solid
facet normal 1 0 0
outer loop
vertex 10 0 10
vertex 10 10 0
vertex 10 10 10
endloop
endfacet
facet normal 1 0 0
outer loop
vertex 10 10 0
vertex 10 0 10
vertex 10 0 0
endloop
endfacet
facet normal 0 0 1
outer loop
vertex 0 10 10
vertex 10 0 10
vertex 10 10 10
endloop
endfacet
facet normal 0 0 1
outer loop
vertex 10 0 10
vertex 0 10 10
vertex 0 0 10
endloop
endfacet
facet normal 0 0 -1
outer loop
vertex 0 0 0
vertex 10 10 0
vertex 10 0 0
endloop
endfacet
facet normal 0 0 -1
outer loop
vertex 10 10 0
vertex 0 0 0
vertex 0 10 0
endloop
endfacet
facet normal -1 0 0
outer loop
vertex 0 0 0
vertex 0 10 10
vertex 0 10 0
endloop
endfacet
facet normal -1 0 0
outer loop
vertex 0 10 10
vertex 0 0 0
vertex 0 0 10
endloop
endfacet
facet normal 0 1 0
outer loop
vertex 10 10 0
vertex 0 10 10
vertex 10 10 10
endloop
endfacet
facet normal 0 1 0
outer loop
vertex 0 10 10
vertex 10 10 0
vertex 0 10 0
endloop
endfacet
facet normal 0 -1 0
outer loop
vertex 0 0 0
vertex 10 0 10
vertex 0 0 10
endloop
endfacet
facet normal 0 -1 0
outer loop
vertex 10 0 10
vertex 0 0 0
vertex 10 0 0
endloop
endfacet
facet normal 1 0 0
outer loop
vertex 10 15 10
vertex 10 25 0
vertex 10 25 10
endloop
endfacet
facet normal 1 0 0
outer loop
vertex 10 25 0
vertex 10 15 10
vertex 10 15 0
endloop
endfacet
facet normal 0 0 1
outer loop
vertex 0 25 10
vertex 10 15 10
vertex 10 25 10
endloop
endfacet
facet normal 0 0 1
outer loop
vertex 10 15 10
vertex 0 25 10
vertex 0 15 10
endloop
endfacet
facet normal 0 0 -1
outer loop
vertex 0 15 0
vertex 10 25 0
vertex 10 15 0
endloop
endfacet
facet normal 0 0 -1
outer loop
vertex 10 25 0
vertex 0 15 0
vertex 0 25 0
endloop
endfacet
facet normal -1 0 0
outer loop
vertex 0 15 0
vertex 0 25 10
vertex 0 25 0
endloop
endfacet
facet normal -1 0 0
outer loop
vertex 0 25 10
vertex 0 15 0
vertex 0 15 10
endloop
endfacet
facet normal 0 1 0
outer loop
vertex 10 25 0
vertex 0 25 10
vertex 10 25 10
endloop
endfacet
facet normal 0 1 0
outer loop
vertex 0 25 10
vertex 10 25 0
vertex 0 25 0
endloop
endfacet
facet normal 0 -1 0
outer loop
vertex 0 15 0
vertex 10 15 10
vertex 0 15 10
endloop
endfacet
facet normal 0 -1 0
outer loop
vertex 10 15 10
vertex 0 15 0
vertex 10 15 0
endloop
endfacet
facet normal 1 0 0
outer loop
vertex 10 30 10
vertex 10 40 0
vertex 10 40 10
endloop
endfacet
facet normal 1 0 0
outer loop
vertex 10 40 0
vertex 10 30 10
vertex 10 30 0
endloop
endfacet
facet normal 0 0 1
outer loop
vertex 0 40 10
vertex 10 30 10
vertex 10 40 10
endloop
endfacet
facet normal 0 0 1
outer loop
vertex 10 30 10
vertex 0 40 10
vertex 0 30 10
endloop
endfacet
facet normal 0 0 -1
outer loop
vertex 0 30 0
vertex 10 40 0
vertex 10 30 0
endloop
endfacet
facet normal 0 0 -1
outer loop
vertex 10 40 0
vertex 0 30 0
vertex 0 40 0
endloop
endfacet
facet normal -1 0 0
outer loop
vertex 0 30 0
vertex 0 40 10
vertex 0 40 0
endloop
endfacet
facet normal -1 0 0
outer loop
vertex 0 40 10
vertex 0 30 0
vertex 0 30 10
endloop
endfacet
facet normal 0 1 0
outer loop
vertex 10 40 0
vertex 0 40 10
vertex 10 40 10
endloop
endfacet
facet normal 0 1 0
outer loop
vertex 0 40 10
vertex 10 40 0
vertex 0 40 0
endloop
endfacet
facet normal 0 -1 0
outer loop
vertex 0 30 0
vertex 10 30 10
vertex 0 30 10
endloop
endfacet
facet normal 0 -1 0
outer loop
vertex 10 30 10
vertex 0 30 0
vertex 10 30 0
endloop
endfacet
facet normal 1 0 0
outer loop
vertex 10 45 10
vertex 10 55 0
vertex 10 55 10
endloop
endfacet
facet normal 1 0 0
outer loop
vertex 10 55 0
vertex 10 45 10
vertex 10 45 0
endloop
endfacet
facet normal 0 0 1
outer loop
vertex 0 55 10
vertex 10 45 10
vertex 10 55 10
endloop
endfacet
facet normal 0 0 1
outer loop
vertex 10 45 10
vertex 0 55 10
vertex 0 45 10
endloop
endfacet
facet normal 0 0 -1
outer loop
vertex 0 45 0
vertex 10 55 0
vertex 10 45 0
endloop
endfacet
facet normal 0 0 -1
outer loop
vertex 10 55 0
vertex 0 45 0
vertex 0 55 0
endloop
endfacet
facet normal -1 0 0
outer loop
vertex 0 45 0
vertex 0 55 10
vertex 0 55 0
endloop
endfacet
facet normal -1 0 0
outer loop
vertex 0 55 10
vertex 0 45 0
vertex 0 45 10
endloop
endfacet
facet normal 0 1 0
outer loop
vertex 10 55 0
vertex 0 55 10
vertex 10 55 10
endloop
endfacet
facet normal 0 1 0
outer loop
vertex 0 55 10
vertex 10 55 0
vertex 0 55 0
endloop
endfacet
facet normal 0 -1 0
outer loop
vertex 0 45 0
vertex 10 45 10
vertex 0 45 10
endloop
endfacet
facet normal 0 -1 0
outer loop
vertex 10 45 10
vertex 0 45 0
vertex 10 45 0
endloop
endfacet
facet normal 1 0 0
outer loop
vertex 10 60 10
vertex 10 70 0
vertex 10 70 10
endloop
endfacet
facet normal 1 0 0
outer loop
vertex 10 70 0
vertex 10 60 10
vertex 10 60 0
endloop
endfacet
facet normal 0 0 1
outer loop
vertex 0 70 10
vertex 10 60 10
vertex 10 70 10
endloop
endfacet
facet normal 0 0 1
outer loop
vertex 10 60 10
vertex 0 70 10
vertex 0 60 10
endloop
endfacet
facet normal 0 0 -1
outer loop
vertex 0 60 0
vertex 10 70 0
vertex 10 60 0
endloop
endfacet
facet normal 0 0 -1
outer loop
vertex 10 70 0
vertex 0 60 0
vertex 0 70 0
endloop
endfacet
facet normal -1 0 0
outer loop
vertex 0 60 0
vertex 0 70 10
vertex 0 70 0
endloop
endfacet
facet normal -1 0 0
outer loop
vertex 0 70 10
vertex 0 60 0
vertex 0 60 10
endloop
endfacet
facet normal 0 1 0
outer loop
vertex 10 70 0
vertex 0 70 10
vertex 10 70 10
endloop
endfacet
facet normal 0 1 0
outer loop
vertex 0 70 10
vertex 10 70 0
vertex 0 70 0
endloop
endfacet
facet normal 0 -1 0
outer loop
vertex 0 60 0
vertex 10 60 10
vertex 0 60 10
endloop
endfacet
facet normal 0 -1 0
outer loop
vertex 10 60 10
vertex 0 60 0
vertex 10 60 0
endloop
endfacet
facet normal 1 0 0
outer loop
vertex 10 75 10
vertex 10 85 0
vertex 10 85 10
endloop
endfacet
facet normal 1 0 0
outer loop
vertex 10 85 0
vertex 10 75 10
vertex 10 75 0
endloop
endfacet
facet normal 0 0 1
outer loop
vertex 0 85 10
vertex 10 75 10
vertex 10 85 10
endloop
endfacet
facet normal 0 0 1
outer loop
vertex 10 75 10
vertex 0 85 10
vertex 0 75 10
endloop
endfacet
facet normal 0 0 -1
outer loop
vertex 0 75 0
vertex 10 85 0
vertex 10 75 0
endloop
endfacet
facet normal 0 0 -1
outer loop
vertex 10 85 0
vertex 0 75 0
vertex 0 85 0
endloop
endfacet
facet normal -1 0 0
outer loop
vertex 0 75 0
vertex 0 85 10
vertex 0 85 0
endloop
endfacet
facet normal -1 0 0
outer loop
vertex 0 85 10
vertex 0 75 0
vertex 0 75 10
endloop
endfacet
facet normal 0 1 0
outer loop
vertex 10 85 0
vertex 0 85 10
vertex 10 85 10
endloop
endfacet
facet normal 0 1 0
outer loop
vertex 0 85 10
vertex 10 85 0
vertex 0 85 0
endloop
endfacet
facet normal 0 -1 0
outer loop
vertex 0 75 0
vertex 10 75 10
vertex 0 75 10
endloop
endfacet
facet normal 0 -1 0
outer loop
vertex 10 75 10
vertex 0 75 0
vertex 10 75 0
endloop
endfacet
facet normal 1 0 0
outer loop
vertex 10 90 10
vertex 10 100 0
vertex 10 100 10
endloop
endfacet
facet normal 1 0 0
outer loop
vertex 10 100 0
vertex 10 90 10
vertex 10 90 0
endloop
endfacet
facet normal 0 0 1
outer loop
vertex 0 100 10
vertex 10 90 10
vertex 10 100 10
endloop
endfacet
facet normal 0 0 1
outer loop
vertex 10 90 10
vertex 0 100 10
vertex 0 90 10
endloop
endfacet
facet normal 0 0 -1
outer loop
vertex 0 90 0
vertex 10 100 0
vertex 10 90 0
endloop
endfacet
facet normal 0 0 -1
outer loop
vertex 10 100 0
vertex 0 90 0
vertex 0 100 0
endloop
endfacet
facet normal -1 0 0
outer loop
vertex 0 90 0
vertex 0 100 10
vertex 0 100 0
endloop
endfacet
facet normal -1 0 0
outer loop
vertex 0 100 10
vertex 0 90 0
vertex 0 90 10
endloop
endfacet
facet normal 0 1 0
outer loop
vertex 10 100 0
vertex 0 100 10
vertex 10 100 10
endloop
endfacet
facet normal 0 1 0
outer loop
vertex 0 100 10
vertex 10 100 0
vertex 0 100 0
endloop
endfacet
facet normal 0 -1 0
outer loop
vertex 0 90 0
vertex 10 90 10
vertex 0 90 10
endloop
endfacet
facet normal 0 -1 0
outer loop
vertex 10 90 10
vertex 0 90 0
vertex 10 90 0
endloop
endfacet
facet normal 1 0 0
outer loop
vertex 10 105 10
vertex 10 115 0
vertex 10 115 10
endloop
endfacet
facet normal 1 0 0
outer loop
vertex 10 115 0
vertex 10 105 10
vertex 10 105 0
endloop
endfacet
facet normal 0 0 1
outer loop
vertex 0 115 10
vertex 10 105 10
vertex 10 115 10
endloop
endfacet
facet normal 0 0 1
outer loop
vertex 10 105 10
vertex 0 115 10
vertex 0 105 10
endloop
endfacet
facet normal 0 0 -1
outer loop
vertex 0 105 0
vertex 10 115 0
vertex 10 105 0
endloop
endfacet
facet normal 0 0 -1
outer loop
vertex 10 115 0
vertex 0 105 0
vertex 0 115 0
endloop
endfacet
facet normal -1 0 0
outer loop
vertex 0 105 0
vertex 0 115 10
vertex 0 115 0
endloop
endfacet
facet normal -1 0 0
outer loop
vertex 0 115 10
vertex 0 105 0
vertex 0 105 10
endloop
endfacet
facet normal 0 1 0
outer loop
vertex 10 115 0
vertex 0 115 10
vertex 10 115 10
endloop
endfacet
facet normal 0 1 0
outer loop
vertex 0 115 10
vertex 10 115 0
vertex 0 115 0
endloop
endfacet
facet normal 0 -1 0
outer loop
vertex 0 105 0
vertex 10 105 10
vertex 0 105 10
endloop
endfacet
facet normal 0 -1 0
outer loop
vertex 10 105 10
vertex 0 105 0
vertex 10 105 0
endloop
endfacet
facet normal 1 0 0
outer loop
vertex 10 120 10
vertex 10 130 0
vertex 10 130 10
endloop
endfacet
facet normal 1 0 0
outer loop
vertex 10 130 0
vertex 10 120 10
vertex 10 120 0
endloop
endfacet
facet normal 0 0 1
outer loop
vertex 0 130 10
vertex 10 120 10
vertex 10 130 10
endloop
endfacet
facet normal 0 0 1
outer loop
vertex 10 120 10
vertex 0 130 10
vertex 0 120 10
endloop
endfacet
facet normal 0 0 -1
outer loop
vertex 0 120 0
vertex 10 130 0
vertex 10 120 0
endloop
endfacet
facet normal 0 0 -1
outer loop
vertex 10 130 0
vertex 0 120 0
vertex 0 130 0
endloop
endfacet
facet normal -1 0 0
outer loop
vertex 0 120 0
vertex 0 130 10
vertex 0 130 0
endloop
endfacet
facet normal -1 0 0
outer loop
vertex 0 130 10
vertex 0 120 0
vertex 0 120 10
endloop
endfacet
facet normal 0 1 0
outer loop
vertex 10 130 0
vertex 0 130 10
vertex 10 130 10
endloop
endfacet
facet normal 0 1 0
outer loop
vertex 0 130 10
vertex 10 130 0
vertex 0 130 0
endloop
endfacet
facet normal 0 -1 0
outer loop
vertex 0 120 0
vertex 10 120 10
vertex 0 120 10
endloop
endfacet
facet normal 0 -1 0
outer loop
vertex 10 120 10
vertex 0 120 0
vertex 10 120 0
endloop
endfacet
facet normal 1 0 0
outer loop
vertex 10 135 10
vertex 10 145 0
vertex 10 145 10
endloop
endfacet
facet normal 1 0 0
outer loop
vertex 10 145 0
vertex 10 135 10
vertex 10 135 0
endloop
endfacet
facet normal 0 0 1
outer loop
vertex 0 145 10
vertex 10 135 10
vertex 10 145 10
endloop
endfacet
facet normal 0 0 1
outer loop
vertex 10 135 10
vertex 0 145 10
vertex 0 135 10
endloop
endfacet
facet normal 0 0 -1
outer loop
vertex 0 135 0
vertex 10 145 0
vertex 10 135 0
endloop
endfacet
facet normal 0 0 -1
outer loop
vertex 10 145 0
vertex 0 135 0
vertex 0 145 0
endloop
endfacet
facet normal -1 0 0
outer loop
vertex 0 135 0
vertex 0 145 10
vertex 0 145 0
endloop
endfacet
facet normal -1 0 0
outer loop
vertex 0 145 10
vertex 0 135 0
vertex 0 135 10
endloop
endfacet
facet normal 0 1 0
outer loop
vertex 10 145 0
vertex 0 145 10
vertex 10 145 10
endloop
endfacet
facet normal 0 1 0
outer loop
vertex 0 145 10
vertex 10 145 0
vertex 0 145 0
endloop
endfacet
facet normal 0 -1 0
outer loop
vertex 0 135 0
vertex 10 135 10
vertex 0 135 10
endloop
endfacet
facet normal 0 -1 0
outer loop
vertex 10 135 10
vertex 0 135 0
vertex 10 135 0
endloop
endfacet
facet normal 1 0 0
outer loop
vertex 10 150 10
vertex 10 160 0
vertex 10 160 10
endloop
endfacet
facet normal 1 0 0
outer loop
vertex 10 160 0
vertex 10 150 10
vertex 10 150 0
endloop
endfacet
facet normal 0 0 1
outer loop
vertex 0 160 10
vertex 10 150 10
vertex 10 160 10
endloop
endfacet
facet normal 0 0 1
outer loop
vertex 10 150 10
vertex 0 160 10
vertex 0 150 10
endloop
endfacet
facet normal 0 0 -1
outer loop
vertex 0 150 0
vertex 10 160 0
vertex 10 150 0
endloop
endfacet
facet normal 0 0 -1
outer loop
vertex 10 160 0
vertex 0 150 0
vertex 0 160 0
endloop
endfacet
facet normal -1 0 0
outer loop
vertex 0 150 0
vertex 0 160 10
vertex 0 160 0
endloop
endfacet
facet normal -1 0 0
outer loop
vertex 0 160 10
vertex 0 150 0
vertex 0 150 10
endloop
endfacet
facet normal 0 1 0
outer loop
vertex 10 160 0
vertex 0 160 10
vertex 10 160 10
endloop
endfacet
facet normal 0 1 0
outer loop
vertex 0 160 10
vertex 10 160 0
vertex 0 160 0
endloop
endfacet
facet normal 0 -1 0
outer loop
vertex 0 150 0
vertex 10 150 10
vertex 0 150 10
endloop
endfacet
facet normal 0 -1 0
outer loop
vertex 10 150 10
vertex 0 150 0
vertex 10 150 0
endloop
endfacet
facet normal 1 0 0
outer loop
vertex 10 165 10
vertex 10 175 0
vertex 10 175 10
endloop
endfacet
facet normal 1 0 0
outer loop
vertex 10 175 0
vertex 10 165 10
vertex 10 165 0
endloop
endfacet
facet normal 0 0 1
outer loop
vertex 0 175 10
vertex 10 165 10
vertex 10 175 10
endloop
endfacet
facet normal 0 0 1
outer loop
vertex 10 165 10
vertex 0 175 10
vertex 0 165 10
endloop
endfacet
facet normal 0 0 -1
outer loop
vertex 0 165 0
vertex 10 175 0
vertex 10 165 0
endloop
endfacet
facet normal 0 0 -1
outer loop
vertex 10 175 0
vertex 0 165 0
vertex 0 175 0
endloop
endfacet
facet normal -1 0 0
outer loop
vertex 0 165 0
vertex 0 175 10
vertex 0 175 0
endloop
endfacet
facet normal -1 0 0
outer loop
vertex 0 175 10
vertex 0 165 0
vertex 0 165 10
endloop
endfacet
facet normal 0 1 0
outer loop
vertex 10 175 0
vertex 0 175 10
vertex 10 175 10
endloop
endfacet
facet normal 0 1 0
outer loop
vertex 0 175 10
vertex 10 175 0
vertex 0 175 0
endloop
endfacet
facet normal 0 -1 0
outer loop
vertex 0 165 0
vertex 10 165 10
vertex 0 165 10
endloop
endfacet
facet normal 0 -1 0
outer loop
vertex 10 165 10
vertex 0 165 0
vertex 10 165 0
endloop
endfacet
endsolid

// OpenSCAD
// color scheme generator
// copy and paste console output to /usr/share/openscad/color-schemes/render/redcyanglasses.json

background         = hsv_deg(0, 0, 95);
highlight          = hsv_deg(75,70,90);
axes_color         = hsv_deg(330,70,90);
opencsg_face_front = hsv_deg(60,70,90);
opencsg_face_back  = hsv_deg(330,70,90);
cgal_face_front    = hsv_deg(60,70,90);
cgal_face_back     = hsv_deg(330,70,90);
cgal_face_2d       = hsv_deg(60,70,90);
cgal_edge_front    = hsv_deg(60,70,90);
cgal_edge_back     = hsv_deg(330,70,90);
cgal_edge_2d       = hsv_deg(330,70,90);
crosshair          = hsv_deg(75,70,90);

// set viewport
$vpt=[68, 88, 5];
$vpr=[0, 0, 0];
$vpd=550;

function hsv_deg(h, s, v) = hsv(h/360,s/100,v/100, 1);
function hsv(h, s = 1, v = 1, a = 1, p, q, t) = (p == undef || q == undef || t == undef) // by LightAtPlay
	? hsv(
		(h%1) * 6,
		s<0?0:s>1?1:s,
		v<0?0:v>1?1:v,
		a,
		(v<0?0:v>1?1:v) * (1 - (s<0?0:s>1?1:s)),
		(v<0?0:v>1?1:v) * (1 - (s<0?0:s>1?1:s) * ((h%1)*6-floor((h%1)*6))),
		(v<0?0:v>1?1:v) * (1 - (s<0?0:s>1?1:s) * (1 - ((h%1)*6-floor((h%1)*6))))
	)
	:
	h < 1 ? [v,t,p,a] :
	h < 2 ? [q,v,p,a] :
	h < 3 ? [p,v,t,a] :
	h < 4 ? [p,q,v,a] :
	h < 5 ? [t,p,v,a] :
	        [v,p,q,a];

hexchars="0123456789ABCDEF";
function hex(a) = str(hexchars[(a / 16) % 16] , hexchars[a % 16]);
function color_to_hex(c) = str(hex(c[0]*255), hex(c[1]*255), hex(c[2]*255));

cs = str(
    "copy and paste to .json:\n",
    "{\n",
    "    \"name\" : \"3D Glasses\",\n",
    "    \"index\" : 2001,\n",
    "    \"show-in-gui\" : true,\n",
    "    \"description\" : \"3d anaglyph\",\n",
    "    \"_comment\" : \"created by colorscheme.scad\",\n",
    "\n",
    "    \"colors\" : {\n",
    "        \"background\" :         \"#", color_to_hex(background), "\",\n",
    "        \"highlight\" :          \"#", color_to_hex(highlight), "80\",\n",
    "        \"axes-color\" :         \"#", color_to_hex(axes_color), "\",\n",
    "        \"opencsg-face-front\" : \"#", color_to_hex(opencsg_face_front), "\",\n",
    "        \"opencsg-face-back\" :  \"#", color_to_hex(opencsg_face_back), "\",\n",
    "        \"cgal-face-front\" :    \"#", color_to_hex(cgal_face_front), "\",\n",
    "        \"cgal-face-back\" :     \"#", color_to_hex(cgal_face_back), "\",\n",
    "        \"cgal-face-2d\" :       \"#", color_to_hex(cgal_face_2d), "\",\n",
    "        \"cgal-edge-front\" :    \"#", color_to_hex(cgal_edge_front), "\",\n",
    "        \"cgal-edge-back\" :     \"#", color_to_hex(cgal_edge_back), "\",\n",
    "        \"cgal-edge-2d\" :       \"#", color_to_hex(cgal_edge_2d), "\",\n",
    "        \"crosshair\" :          \"#", color_to_hex(crosshair), "\"\n",
    "    }\n",
    "}\n"
    );
    
echo(cs);    

// display colors

colors = [
    background,
    highlight,
    axes_color,
    opencsg_face_front,
    opencsg_face_back,
    cgal_face_front,
    cgal_face_back,
    cgal_face_2d,
    cgal_edge_front,
    cgal_edge_back,
    cgal_edge_2d,
    crosshair];
    
names = [
    "background",
    "highlight",
    "axes_color",
    "opencsg_face_front",
    "opencsg_face_back",
    "cgal_face_front",
    "cgal_face_back",
    "cgal_face_2d",
    "cgal_edge_front",
    "cgal_edge_back",
    "cgal_edge_2d",
    "crosshair"];
  
for (i = [0:len(colors)-1]) {
    translate([0, i*15, 0])
    color(colors[i])
    cube(10);
    translate([15, i*15, 0])
    text(names[i], valign = "bottom");
}

// not truncated
